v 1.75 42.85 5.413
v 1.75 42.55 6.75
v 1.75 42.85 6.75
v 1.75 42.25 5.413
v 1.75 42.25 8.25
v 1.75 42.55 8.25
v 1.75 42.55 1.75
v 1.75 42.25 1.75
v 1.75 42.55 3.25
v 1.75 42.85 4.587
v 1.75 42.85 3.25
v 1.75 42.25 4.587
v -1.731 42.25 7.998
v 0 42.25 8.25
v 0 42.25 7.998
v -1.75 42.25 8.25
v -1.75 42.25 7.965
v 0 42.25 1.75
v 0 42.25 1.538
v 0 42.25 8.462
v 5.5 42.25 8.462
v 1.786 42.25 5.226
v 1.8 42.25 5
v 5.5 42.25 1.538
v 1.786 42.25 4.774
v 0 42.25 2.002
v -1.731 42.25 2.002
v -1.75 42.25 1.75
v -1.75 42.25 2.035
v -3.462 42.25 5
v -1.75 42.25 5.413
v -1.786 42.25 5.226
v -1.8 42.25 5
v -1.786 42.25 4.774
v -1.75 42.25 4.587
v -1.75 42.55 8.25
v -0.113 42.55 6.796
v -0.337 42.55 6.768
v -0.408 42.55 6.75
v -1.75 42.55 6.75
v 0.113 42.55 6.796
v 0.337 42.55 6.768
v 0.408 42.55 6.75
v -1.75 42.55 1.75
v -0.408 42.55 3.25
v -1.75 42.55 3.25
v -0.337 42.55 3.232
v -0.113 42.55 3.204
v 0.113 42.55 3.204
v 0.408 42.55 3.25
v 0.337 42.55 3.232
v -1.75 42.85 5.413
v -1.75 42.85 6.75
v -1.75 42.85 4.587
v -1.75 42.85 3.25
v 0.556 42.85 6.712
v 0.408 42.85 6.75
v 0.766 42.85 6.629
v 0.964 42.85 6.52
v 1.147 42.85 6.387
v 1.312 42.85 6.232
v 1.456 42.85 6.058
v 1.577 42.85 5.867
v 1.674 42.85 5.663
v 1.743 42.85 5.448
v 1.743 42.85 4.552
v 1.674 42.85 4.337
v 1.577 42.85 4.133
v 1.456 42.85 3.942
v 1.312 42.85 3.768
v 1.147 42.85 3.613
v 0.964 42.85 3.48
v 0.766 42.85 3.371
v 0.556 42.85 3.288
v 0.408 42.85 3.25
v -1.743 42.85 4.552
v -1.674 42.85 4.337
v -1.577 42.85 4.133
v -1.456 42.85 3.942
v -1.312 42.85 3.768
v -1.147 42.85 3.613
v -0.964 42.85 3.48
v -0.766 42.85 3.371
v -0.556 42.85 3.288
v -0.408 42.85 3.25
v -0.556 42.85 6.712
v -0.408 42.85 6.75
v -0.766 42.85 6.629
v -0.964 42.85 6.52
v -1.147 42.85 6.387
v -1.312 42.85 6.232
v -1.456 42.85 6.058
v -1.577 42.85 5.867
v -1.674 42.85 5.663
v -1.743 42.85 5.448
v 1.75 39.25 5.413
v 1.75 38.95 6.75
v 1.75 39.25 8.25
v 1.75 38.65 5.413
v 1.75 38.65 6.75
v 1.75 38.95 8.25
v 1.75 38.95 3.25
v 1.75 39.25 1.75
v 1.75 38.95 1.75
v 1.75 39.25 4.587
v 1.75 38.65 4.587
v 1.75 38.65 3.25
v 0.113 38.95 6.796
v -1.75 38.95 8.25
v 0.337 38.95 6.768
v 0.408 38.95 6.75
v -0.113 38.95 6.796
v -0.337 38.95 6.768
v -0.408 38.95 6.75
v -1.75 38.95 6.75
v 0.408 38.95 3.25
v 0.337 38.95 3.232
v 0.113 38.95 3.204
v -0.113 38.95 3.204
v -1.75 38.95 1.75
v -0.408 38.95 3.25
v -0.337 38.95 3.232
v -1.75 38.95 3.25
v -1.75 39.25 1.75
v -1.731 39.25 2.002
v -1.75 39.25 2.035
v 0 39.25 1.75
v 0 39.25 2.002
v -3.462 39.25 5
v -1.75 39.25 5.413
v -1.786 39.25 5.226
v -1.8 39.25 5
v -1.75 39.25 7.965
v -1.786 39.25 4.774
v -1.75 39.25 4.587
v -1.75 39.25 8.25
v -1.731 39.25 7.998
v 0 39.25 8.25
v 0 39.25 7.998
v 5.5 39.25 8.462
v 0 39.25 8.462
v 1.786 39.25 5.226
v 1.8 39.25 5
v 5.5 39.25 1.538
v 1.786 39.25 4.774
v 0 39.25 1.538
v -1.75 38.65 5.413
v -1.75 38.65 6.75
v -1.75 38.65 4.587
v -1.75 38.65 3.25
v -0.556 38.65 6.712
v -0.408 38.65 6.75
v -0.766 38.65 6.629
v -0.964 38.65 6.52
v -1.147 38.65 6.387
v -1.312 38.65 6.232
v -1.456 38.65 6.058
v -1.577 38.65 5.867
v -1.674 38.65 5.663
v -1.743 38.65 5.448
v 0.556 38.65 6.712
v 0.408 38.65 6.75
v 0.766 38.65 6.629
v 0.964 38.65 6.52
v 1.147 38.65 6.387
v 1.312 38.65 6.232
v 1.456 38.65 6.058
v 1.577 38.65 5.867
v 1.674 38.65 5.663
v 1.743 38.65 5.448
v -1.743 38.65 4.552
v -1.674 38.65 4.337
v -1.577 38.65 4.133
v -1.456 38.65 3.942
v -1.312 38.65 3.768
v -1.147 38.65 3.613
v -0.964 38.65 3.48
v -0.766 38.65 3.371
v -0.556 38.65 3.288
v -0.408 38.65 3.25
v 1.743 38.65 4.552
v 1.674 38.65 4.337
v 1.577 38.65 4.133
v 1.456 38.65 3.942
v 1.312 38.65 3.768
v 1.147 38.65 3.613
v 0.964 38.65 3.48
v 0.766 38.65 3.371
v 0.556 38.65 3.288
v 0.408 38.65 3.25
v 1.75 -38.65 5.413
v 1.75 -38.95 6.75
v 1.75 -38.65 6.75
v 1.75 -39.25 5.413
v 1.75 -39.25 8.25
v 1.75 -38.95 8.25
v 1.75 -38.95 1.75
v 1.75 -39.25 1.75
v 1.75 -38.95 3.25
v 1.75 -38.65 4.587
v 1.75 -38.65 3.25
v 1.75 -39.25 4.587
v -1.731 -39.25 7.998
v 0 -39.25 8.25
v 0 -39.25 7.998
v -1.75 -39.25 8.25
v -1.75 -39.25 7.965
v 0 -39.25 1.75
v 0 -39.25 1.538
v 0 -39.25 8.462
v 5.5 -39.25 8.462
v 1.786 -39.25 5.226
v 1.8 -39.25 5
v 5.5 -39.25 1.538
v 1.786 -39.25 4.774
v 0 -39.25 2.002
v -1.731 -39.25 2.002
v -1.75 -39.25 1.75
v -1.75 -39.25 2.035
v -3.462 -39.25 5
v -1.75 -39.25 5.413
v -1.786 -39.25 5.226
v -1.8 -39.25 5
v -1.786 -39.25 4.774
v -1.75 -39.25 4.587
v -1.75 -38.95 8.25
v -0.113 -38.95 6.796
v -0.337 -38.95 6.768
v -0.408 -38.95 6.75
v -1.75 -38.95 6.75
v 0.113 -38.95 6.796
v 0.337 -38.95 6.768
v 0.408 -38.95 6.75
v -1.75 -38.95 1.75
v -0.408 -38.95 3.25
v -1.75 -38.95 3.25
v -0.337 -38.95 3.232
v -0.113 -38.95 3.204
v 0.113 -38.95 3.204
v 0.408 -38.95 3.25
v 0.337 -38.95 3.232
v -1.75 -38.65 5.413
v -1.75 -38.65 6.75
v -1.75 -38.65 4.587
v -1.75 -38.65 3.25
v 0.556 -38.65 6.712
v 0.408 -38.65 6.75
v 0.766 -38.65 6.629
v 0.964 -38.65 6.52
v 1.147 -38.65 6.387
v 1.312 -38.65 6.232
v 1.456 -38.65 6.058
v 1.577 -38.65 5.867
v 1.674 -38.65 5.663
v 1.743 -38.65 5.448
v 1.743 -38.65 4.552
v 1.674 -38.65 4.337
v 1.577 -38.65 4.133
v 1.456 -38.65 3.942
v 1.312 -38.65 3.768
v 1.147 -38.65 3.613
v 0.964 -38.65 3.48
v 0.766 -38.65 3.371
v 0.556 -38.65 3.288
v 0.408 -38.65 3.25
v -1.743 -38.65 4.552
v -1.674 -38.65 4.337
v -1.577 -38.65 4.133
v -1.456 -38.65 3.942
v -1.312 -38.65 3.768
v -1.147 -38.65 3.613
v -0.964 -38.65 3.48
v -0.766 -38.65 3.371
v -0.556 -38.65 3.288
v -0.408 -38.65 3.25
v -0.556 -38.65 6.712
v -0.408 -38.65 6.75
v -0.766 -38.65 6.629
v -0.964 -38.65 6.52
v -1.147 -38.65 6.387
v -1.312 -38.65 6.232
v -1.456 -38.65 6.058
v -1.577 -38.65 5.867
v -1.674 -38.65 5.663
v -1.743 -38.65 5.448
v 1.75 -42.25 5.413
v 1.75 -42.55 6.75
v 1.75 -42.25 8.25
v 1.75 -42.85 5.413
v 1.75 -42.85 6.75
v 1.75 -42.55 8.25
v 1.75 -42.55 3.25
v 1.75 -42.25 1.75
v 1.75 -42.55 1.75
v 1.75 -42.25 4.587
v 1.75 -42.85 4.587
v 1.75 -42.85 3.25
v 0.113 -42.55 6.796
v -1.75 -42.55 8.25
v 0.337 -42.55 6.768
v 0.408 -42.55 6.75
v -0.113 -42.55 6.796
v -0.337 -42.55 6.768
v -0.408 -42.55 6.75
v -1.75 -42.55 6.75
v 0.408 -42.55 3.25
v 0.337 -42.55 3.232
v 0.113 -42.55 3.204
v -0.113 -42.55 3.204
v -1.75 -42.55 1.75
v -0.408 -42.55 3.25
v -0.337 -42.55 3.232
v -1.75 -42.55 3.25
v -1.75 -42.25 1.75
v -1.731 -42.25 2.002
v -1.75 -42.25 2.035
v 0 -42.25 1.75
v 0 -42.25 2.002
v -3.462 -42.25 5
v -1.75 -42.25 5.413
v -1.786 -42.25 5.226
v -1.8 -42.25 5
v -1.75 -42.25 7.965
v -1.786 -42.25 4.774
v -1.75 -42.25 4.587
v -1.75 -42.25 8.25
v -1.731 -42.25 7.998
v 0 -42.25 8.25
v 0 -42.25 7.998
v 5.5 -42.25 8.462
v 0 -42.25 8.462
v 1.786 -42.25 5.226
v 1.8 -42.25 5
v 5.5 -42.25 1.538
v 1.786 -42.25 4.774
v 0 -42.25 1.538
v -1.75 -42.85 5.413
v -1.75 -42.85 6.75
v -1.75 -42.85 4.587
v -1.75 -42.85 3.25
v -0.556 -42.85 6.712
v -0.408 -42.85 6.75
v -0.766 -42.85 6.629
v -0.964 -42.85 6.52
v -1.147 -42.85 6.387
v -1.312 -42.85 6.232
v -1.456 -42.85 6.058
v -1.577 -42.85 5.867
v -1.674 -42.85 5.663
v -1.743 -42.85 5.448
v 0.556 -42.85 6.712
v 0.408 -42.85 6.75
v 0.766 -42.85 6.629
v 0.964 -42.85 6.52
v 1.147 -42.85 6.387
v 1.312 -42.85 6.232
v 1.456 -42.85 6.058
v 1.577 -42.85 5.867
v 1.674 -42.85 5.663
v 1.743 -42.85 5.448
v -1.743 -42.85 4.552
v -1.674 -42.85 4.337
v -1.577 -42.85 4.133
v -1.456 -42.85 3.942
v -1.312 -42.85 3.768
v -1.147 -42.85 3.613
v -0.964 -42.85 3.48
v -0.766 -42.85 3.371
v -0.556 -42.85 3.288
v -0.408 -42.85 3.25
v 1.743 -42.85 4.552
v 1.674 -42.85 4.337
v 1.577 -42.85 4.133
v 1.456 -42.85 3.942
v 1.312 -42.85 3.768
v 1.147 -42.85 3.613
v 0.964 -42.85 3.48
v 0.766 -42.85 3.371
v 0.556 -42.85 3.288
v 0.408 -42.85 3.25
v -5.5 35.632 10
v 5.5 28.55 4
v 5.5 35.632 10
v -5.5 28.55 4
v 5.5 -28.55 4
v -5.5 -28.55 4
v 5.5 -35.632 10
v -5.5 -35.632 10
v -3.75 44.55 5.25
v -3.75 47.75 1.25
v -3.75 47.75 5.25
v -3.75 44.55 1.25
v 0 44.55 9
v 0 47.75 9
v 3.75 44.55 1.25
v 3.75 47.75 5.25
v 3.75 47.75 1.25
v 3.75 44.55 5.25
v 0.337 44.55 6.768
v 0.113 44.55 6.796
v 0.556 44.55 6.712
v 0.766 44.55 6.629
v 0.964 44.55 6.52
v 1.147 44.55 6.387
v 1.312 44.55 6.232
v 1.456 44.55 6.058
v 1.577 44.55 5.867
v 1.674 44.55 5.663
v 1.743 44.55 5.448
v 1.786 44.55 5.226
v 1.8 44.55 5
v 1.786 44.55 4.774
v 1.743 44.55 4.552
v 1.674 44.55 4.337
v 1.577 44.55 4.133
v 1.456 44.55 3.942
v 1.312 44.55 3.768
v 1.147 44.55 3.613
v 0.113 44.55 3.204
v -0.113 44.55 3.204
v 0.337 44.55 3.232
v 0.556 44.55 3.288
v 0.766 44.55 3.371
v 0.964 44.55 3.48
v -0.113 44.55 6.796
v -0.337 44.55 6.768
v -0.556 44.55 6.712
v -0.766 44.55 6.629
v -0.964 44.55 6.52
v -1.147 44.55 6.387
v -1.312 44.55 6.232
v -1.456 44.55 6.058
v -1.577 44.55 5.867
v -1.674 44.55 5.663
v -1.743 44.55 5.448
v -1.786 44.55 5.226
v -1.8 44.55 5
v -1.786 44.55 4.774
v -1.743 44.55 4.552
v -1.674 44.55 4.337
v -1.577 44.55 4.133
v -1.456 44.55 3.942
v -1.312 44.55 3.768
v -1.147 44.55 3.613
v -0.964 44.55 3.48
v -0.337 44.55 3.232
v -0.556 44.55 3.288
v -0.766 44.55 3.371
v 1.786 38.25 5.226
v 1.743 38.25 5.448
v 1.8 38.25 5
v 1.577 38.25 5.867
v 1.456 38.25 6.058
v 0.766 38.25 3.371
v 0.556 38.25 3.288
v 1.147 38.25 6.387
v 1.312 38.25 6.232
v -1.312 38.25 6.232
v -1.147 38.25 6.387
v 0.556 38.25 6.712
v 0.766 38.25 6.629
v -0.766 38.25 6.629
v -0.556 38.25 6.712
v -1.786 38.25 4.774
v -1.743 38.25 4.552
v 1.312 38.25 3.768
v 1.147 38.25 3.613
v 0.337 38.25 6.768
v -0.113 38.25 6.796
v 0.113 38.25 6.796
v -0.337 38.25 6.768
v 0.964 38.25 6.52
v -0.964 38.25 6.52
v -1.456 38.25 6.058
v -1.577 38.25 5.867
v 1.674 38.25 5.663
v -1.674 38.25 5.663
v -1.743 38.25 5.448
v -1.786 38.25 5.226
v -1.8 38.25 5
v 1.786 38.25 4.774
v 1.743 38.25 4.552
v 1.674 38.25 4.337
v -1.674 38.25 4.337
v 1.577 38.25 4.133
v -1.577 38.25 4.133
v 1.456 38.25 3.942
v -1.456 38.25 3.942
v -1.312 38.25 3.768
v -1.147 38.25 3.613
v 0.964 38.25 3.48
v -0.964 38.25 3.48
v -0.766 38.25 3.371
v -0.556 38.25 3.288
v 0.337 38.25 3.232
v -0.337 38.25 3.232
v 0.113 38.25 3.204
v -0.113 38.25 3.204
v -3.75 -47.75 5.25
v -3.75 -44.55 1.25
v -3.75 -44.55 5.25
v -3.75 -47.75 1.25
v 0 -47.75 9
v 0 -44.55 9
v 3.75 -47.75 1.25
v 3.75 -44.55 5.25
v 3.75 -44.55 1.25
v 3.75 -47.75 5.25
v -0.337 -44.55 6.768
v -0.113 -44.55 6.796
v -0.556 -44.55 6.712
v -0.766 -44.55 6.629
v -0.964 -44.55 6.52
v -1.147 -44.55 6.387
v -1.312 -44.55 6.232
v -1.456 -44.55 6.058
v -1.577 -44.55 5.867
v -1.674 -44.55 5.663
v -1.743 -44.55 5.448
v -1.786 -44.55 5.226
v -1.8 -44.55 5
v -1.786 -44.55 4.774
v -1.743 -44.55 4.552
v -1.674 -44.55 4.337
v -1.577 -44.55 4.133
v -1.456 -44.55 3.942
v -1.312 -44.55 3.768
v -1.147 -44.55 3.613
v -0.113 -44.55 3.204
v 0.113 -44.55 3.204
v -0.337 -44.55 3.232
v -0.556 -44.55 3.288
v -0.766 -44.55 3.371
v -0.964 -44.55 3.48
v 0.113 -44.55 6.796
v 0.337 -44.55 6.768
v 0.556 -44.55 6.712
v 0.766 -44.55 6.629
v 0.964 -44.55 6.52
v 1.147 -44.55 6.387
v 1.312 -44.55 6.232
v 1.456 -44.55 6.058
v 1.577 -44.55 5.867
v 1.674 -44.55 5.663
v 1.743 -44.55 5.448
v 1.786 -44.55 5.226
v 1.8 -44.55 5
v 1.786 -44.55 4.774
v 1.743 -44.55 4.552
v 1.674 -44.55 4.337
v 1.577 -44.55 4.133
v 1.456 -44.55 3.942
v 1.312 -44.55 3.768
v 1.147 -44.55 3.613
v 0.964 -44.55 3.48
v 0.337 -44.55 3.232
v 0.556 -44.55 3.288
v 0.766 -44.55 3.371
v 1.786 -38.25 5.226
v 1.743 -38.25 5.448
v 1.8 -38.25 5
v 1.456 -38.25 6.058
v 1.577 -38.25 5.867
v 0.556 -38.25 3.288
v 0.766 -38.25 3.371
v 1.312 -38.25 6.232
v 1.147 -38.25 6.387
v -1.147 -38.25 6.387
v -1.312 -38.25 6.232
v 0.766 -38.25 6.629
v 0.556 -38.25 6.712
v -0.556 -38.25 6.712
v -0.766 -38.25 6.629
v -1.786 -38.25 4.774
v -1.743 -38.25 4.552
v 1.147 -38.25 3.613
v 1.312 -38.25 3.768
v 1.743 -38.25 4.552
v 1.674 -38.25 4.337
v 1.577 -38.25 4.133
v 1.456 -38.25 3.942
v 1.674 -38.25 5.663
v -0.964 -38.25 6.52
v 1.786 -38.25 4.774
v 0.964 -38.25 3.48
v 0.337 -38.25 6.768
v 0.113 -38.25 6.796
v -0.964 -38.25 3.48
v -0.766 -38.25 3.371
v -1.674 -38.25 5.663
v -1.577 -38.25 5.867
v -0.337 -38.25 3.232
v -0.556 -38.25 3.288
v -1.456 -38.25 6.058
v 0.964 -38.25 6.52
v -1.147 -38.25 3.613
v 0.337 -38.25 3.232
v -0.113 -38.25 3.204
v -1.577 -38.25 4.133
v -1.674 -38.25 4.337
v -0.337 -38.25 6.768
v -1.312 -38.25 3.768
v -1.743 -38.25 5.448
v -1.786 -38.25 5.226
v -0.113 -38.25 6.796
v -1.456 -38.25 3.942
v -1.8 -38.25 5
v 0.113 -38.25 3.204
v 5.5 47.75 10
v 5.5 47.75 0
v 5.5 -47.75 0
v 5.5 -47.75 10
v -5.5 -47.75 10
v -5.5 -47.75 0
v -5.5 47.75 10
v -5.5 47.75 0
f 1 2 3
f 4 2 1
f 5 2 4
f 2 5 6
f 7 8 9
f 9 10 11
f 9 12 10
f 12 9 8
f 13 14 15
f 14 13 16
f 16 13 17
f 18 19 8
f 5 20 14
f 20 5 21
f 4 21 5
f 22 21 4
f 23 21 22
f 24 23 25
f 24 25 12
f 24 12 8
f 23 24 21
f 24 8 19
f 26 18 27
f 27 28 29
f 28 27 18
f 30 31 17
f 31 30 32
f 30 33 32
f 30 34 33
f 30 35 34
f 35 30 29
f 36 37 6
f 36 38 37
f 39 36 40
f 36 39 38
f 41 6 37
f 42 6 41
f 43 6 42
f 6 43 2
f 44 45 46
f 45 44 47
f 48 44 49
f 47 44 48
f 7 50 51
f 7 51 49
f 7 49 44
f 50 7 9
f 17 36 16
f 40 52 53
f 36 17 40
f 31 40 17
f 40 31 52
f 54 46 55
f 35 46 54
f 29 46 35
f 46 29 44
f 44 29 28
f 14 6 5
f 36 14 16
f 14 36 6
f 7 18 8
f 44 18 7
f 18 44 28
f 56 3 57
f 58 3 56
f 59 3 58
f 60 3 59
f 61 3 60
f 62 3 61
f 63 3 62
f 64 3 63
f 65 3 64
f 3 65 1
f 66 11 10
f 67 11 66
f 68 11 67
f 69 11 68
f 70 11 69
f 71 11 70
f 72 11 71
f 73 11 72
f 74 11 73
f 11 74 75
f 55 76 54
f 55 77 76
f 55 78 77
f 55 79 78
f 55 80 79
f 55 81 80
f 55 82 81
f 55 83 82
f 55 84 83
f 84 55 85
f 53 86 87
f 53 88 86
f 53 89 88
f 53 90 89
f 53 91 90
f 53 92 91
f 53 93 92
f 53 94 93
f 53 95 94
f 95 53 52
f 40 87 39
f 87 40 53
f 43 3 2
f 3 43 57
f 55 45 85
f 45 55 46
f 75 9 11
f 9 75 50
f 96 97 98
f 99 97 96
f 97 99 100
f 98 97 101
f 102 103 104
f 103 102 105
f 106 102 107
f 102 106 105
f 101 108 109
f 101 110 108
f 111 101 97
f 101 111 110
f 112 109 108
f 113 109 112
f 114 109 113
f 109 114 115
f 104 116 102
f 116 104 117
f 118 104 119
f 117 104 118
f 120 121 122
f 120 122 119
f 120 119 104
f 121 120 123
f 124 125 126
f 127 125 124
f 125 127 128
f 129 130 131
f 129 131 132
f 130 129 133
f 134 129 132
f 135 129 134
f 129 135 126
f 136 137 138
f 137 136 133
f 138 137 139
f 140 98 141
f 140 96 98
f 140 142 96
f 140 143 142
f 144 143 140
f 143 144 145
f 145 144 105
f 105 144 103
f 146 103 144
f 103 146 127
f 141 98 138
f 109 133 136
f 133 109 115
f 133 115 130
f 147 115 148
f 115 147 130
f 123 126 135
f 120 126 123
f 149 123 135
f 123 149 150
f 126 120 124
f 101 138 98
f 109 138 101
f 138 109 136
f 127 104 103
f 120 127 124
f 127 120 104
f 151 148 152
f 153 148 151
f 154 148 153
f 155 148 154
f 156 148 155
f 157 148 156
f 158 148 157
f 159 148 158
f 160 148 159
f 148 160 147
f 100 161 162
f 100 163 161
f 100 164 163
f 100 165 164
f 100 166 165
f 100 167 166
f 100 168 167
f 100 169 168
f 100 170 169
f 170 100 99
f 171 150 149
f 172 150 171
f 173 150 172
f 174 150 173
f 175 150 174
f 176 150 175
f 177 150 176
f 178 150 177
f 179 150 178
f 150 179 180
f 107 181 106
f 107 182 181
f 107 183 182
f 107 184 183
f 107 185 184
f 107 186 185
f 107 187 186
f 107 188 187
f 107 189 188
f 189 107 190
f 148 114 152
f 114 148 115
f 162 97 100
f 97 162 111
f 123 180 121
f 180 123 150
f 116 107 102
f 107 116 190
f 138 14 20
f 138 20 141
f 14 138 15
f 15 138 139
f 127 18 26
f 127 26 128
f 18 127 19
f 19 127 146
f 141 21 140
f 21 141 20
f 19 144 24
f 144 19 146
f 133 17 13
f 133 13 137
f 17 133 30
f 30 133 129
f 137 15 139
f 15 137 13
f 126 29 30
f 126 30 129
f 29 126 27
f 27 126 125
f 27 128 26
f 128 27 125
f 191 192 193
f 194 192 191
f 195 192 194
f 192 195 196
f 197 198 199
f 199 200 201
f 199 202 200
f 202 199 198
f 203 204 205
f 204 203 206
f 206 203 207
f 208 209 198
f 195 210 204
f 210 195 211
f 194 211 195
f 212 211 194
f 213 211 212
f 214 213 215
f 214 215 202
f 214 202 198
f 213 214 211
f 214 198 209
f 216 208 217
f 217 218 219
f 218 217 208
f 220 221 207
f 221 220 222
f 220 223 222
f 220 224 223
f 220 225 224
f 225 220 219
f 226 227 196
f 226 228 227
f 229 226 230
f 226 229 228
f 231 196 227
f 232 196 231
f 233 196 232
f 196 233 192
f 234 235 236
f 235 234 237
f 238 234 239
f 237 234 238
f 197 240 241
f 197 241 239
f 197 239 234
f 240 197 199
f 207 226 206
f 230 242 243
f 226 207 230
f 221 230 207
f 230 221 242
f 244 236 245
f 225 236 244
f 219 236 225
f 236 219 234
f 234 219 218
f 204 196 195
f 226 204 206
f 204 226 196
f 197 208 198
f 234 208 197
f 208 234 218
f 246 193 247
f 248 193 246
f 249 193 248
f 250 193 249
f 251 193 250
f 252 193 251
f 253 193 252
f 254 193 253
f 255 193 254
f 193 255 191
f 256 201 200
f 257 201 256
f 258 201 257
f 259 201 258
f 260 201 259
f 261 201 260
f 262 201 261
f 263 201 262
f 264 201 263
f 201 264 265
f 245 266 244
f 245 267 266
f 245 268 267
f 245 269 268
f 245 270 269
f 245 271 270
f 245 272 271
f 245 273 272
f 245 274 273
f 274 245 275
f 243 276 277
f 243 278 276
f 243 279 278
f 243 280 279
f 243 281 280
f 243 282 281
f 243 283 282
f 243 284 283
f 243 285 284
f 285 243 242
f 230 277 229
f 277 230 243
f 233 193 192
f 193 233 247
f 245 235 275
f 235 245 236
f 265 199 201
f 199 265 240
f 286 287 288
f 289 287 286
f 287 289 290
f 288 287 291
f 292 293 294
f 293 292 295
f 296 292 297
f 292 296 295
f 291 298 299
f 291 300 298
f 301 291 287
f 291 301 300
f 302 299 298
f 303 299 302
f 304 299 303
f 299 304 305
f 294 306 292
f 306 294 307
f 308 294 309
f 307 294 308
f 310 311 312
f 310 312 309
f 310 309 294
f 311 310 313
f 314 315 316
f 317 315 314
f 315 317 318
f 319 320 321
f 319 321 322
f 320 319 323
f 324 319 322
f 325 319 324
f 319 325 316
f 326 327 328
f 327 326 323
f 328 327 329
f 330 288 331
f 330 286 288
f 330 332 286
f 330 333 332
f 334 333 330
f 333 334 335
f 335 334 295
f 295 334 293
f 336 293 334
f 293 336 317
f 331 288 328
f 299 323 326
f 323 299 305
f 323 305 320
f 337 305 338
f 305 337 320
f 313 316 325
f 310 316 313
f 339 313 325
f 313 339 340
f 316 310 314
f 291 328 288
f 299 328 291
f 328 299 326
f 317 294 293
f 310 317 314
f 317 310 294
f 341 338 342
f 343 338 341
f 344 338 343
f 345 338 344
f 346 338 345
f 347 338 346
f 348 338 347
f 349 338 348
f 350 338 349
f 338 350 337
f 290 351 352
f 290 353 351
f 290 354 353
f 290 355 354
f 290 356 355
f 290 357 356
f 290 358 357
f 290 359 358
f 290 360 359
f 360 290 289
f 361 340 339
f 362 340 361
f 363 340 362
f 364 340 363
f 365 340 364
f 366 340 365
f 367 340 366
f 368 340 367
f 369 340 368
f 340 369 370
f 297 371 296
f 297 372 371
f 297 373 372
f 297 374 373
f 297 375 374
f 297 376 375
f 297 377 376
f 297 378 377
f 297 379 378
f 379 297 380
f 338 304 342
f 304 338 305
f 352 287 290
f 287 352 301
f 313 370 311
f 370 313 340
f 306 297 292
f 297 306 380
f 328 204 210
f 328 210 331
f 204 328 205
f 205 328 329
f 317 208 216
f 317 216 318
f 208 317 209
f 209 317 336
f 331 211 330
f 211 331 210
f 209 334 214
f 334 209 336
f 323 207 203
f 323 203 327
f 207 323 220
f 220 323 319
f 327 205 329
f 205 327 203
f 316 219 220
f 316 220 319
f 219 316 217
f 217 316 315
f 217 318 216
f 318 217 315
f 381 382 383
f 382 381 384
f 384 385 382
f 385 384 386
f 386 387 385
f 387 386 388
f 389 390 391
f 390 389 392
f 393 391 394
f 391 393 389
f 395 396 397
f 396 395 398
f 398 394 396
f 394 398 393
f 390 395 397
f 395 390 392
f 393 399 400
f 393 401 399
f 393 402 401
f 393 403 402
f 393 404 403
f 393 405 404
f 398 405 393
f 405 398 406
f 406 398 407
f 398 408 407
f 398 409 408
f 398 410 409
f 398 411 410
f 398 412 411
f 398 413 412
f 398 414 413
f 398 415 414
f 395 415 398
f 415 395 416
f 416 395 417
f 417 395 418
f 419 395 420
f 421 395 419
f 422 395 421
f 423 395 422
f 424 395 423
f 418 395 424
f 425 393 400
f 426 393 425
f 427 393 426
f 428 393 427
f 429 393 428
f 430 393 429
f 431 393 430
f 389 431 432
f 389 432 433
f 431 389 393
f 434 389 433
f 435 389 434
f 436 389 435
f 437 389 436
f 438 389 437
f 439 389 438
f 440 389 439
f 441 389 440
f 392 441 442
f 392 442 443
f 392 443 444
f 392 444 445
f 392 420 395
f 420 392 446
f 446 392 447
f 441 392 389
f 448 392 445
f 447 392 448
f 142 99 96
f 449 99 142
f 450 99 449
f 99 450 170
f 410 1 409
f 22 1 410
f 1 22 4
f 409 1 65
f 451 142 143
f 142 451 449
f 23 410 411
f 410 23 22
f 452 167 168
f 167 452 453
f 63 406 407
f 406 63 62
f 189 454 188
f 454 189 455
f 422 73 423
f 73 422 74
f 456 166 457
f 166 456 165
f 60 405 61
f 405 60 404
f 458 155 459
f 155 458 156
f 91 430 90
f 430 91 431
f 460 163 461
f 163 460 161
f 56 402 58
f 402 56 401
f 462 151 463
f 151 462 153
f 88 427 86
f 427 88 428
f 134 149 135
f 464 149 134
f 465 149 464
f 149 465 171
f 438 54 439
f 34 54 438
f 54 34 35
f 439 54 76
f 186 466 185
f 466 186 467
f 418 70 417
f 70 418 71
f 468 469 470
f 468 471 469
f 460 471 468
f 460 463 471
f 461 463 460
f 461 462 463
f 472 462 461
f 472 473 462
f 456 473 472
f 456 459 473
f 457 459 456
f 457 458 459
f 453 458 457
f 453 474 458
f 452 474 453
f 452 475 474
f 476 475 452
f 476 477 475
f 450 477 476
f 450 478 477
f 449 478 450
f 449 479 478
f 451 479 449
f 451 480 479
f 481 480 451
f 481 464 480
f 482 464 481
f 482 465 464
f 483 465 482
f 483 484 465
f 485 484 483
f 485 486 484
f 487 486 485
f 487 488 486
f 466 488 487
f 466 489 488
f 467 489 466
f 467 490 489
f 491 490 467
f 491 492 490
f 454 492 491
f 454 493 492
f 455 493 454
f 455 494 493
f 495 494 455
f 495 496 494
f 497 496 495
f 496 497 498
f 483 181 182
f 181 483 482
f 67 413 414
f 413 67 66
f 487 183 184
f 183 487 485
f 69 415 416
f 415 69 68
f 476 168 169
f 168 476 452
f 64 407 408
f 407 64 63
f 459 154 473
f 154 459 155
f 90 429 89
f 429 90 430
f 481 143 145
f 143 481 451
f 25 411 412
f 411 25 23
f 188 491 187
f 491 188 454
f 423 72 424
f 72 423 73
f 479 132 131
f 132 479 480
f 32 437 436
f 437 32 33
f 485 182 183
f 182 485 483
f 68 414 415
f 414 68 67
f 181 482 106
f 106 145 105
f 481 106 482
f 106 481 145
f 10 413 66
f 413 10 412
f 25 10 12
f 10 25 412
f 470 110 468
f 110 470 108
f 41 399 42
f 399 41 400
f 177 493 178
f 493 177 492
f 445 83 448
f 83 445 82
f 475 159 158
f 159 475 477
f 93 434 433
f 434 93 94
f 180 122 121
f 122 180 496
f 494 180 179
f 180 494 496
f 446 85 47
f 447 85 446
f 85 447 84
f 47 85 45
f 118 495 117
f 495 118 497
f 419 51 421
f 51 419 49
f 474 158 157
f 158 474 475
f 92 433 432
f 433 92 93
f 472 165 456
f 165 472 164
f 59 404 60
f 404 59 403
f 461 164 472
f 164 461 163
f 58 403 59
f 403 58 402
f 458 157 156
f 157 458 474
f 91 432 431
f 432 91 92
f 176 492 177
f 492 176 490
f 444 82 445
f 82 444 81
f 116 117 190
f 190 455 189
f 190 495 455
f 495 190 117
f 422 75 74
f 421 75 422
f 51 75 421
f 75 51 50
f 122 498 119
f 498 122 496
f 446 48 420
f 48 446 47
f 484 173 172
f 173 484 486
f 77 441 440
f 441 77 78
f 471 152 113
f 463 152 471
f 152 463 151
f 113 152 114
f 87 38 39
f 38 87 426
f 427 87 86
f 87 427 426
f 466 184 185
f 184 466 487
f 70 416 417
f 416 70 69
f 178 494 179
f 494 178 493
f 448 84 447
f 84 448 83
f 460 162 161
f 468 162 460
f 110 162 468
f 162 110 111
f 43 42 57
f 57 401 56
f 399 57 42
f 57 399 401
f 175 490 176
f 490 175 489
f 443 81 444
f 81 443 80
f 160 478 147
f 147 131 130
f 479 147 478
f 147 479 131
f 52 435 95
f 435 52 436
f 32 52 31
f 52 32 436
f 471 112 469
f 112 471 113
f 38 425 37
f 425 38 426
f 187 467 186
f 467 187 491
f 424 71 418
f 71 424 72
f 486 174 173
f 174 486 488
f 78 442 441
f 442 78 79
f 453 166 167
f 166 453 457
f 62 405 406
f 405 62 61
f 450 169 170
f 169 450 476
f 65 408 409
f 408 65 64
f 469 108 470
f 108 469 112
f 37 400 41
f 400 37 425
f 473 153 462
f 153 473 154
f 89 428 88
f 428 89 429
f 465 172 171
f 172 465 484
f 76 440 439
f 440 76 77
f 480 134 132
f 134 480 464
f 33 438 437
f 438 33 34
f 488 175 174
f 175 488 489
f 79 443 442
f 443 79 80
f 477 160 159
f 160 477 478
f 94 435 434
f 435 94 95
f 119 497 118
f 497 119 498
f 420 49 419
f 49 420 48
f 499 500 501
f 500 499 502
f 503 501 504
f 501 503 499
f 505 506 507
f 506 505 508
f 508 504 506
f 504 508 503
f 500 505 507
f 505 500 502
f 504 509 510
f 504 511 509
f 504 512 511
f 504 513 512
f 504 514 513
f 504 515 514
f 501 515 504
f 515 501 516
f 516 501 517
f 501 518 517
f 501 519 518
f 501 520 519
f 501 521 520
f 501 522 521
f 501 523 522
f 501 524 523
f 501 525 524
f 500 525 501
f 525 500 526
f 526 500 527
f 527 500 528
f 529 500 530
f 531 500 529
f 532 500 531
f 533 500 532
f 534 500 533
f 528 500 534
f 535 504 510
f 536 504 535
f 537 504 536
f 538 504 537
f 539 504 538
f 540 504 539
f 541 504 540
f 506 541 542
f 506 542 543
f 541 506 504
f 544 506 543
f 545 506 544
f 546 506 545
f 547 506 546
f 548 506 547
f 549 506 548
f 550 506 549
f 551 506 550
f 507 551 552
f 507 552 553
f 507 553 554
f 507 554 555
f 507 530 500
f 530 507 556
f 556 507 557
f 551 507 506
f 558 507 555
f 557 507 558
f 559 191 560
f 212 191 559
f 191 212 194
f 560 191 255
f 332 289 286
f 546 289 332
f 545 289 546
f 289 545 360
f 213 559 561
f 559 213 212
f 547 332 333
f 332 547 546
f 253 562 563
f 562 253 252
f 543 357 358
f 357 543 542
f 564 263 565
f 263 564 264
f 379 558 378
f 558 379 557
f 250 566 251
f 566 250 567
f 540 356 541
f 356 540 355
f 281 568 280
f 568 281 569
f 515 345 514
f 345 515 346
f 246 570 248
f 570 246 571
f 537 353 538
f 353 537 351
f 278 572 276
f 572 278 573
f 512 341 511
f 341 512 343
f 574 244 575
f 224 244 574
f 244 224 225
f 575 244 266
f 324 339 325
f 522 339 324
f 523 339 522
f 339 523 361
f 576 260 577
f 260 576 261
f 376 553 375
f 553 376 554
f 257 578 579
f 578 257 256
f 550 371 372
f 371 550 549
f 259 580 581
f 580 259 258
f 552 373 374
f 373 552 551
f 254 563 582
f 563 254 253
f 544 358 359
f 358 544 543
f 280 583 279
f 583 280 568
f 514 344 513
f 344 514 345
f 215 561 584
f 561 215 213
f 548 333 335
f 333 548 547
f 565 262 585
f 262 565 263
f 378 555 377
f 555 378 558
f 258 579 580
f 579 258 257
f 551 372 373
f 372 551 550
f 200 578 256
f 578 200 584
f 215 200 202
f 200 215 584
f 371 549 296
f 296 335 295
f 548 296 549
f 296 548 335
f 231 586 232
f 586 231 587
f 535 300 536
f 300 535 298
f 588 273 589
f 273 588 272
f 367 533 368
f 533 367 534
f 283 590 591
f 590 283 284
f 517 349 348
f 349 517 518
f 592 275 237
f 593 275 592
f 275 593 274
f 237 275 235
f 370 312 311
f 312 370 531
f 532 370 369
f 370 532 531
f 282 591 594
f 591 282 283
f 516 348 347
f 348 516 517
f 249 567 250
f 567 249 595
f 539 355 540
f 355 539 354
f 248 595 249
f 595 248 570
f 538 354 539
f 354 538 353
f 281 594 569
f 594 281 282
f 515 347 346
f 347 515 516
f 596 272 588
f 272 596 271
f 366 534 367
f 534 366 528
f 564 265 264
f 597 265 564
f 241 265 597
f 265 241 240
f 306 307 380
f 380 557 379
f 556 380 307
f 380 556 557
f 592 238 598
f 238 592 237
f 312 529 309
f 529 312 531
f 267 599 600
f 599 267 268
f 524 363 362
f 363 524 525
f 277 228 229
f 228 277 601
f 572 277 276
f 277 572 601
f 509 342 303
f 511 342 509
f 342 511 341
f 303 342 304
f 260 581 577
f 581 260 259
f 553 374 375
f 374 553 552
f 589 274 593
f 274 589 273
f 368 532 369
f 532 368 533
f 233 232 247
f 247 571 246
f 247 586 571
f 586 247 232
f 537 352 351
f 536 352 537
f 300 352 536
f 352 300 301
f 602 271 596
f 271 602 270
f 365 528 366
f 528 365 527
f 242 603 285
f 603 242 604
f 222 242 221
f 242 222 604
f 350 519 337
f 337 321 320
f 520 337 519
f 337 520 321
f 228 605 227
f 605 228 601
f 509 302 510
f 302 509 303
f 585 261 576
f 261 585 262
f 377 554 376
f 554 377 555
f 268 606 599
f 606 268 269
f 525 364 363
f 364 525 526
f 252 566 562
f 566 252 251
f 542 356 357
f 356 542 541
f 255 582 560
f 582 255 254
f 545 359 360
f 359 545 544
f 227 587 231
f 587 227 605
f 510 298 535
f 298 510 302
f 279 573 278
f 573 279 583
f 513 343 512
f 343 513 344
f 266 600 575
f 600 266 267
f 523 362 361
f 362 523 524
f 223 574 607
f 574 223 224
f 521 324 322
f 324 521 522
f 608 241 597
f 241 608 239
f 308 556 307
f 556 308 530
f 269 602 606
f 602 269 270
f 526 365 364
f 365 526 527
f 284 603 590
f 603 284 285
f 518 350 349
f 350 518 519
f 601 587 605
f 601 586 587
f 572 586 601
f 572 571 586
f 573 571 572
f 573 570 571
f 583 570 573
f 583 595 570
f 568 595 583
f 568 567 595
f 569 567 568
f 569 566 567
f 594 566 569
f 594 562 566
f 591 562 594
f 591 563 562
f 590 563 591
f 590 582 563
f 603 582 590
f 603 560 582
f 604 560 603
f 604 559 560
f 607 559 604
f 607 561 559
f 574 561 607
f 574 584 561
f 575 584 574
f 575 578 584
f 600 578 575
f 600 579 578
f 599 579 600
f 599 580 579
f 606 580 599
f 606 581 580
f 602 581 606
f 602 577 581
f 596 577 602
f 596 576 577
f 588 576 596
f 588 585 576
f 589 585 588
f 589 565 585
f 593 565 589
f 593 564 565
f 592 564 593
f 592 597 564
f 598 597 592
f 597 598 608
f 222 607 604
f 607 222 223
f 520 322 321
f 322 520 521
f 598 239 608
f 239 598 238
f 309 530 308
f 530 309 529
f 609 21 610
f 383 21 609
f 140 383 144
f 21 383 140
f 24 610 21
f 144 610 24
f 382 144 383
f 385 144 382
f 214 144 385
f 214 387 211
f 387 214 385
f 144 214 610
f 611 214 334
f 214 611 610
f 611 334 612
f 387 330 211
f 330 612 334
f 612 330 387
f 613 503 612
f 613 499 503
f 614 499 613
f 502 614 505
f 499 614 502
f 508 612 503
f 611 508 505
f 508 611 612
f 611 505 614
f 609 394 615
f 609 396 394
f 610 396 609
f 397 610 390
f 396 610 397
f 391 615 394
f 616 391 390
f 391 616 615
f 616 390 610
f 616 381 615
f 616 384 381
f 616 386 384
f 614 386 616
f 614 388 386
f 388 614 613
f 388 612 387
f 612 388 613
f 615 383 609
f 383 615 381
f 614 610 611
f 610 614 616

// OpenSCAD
$fn = 50;

difference() {
	union() {
		translate(v = [0, 47.75, 0]) {
			rotate(a = [90, 0, 0]) {
				difference() {
					union() {
						translate(v = [-5.5, 0, 0]) {
							cube(size = [11.0, 10.0, 95.5]);
						}
					}
					union() {
						translate(v = [0, 5.0, 5.5]) {
							rotate(a = [0, 0, 0]) {
								difference() {
									union() {
										translate(v = [-1.75, -3.25, -0.3]) {
											cube(size = [3.5, 6.5, 0.3]);
										}
										translate(v = [-1.75, -1.75, -0.6]) {
											cube(size = [3.5, 3.5, 0.3]);
										}
										translate(v = [-1.75, -3.25, 3]) {
											cube(size = [3.5, 6.5, 0.3]);
										}
										translate(v = [-1.75, -1.75, 3.3]) {
											cube(size = [3.5, 3.5, 0.3]);
										}
										translate(v = [0.0, -3.4619999999999997, 0]) {
											cube(size = [20, 6.9239999999999995, 3]);
										}
										linear_extrude(height = 3) {
											polygon(points = [[3.4619999999999997, 0.0], [1.7310000000000003, 2.9981799479017264], [-1.7309999999999992, 2.9981799479017264], [-3.4619999999999997, 4.2397272186481365e-16], [-1.7310000000000014, -2.998179947901726], [1.7309999999999977, -2.9981799479017277]]);
										}
										translate(v = [-1.75, -3.25, -0.3]) {
											cube(size = [3.5, 6.5, 0.3]);
										}
										translate(v = [-1.75, -1.75, -0.6]) {
											cube(size = [3.5, 3.5, 0.3]);
										}
										translate(v = [-1.75, -3.25, 3]) {
											cube(size = [3.5, 6.5, 0.3]);
										}
										translate(v = [-1.75, -1.75, 3.3]) {
											cube(size = [3.5, 3.5, 0.3]);
										}
										translate(v = [-1.75, -3.25, -0.3]) {
											cube(size = [3.5, 6.5, 0.3]);
										}
										translate(v = [-1.75, -1.75, -0.6]) {
											cube(size = [3.5, 3.5, 0.3]);
										}
										translate(v = [-1.75, -3.25, 3]) {
											cube(size = [3.5, 6.5, 0.3]);
										}
										translate(v = [-1.75, -1.75, 3.3]) {
											cube(size = [3.5, 3.5, 0.3]);
										}
									}
									union();
								}
							}
						}
						translate(v = [0, 5.0, 87.0]) {
							rotate(a = [0, 0, 0]) {
								difference() {
									union() {
										translate(v = [-1.75, -3.25, -0.3]) {
											cube(size = [3.5, 6.5, 0.3]);
										}
										translate(v = [-1.75, -1.75, -0.6]) {
											cube(size = [3.5, 3.5, 0.3]);
										}
										translate(v = [-1.75, -3.25, 3]) {
											cube(size = [3.5, 6.5, 0.3]);
										}
										translate(v = [-1.75, -1.75, 3.3]) {
											cube(size = [3.5, 3.5, 0.3]);
										}
										translate(v = [0.0, -3.4619999999999997, 0]) {
											cube(size = [20, 6.9239999999999995, 3]);
										}
										linear_extrude(height = 3) {
											polygon(points = [[3.4619999999999997, 0.0], [1.7310000000000003, 2.9981799479017264], [-1.7309999999999992, 2.9981799479017264], [-3.4619999999999997, 4.2397272186481365e-16], [-1.7310000000000014, -2.998179947901726], [1.7309999999999977, -2.9981799479017277]]);
										}
										translate(v = [-1.75, -3.25, -0.3]) {
											cube(size = [3.5, 6.5, 0.3]);
										}
										translate(v = [-1.75, -1.75, -0.6]) {
											cube(size = [3.5, 3.5, 0.3]);
										}
										translate(v = [-1.75, -3.25, 3]) {
											cube(size = [3.5, 6.5, 0.3]);
										}
										translate(v = [-1.75, -1.75, 3.3]) {
											cube(size = [3.5, 3.5, 0.3]);
										}
										translate(v = [-1.75, -3.25, -0.3]) {
											cube(size = [3.5, 6.5, 0.3]);
										}
										translate(v = [-1.75, -1.75, -0.6]) {
											cube(size = [3.5, 3.5, 0.3]);
										}
										translate(v = [-1.75, -3.25, 3]) {
											cube(size = [3.5, 6.5, 0.3]);
										}
										translate(v = [-1.75, -1.75, 3.3]) {
											cube(size = [3.5, 3.5, 0.3]);
										}
									}
									union();
								}
							}
						}
						translate(v = [-5.6, 0, 0]) {
							rotate(a = [90, 0, 90]) {
								linear_extrude(height = 11.2) {
									polygon(points = [[10.1, 12.0], [10.1, 83.5], [4.0, 76.3], [4.0, 19.2]]);
								}
							}
						}
						translate(v = [0, 0, -0.1]) {
							linear_extrude(height = 3.3000000000000003) {
								polygon(points = [[-3.75, 1.25], [3.75, 1.25], [3.75, 5.25], [0, 9.0], [-3.75, 5.25]]);
							}
						}
						translate(v = [0, 5.0, -0.1]) {
							cylinder(h = 9.6, r = 1.8);
						}
						translate(v = [0, 0, 92.3]) {
							linear_extrude(height = 3.3000000000000003) {
								polygon(points = [[-3.75, 1.25], [3.75, 1.25], [3.75, 5.25], [0, 9.0], [-3.75, 5.25]]);
							}
						}
						translate(v = [0, 5.0, 86.0]) {
							cylinder(h = 9.6, r = 1.8);
						}
					}
				}
			}
		}
	}
	union();
}
